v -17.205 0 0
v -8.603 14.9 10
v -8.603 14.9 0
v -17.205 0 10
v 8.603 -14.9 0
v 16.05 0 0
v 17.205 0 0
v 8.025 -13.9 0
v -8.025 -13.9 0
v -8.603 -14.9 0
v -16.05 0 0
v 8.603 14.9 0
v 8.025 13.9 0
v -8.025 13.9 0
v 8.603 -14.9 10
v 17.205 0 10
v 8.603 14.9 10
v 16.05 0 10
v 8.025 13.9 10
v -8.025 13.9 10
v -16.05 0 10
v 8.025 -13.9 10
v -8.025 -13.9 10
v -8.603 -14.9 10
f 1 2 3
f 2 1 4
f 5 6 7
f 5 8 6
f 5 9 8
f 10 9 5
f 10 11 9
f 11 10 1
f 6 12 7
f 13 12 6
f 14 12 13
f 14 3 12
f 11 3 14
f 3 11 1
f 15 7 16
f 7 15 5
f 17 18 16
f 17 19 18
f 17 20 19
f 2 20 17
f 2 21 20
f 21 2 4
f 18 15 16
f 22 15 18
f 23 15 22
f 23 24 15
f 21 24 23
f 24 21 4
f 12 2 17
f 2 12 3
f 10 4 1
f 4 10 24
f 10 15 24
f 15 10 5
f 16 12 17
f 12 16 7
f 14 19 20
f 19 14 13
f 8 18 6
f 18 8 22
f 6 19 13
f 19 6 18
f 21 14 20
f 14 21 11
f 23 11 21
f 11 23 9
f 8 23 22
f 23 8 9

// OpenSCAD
// file: hexagon.scad
module hexagon (h = 10, s = 59.7)
{
  r = s / 2 / cos (30);
  linear_extrude (height = h)
    polygon ([for (phi = [0:60:360]) [r*cos(phi), r*sin(phi)]]);
}
// main file
use <hexagon.scad>

// adapter1.FCStd nachbauen
// FIXME: ist noch WIP
difference ()
{
  hexagon(h = 10, s = 29.8);
  translate ([0, 0, -0.01])
    hexagon(h = 10.02, s = 27.8);
}
